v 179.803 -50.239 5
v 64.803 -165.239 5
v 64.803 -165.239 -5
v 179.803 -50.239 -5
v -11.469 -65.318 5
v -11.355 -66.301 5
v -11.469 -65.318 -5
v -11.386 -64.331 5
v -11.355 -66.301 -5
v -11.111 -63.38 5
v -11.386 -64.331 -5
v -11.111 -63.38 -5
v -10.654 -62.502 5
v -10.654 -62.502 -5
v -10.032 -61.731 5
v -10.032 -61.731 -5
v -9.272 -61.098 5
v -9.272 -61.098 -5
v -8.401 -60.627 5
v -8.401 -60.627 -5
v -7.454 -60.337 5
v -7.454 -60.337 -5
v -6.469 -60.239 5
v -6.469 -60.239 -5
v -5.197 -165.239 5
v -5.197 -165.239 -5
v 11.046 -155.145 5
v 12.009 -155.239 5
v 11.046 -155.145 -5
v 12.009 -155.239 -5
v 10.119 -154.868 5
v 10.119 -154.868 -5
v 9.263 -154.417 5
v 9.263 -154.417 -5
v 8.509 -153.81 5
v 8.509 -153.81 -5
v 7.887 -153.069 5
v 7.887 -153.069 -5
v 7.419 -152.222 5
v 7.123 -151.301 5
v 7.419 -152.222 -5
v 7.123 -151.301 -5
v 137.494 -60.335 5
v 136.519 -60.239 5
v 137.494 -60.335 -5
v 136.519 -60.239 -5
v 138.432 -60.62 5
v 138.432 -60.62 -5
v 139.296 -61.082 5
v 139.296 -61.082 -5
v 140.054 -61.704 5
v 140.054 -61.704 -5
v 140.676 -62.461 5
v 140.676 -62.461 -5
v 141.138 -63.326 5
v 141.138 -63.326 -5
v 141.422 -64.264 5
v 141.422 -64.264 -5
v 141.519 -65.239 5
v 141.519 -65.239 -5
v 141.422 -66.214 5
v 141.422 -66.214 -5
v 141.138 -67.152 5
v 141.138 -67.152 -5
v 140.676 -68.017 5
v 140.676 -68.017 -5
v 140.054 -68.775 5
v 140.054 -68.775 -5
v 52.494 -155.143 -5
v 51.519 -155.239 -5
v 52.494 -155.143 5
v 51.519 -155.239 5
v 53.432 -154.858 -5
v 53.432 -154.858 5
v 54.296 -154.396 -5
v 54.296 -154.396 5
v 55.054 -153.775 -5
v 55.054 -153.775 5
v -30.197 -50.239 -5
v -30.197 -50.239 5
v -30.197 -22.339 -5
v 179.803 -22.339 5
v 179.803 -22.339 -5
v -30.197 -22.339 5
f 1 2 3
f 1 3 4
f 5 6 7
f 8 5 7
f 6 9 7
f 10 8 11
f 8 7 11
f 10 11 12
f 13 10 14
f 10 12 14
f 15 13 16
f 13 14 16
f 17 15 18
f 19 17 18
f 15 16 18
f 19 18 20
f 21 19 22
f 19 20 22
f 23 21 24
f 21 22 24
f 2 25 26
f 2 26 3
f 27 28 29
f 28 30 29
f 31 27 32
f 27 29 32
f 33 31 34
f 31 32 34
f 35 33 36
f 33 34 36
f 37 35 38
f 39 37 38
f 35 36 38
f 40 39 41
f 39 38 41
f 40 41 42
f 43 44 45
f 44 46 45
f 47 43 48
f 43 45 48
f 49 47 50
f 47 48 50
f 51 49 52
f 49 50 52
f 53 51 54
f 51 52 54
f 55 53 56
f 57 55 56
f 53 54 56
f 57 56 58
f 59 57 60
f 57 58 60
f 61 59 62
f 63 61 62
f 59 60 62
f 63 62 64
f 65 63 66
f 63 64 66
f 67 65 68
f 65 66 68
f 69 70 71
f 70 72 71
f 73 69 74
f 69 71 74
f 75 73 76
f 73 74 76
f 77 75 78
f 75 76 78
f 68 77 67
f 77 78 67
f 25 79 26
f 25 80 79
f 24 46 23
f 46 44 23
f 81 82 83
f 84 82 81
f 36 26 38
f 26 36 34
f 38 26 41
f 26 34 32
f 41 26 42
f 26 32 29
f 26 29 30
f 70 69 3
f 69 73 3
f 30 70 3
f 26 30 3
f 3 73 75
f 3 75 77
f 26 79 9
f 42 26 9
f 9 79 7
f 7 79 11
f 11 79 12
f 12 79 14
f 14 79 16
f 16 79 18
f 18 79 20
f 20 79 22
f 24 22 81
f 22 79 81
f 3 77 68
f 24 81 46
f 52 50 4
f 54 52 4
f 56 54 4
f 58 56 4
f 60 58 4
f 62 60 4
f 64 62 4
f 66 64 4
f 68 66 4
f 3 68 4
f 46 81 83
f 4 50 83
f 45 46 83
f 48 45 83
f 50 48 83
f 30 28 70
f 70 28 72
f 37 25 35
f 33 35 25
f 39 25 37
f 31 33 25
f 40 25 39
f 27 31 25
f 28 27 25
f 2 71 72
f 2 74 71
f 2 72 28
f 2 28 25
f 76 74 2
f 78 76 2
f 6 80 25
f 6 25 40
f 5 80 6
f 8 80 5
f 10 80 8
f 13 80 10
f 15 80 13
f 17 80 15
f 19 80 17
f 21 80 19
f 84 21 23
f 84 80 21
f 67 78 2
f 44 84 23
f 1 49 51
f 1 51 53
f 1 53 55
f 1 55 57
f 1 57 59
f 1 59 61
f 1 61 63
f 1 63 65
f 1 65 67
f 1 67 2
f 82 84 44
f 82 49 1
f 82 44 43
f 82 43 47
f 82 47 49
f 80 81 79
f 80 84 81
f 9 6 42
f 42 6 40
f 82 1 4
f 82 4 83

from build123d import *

# Parameters (mm, degrees)
BOSS_EXTRU_1_DEPTH = 5
FILLET1_R          = 5


with BuildPart() as part:
    # Esquisse2 → Boss.-Extru.1 (new, symmetric)
    with BuildSketch(Plane.XY):
        Polygon((-30.197209457, -50.23903484), (-5.197209457, -165.23903484), (64.802790543, -165.23903484), (179.802790543, -50.23903484), (179.802790543, -22.33903484), (-30.197209457, -22.33903484), align=None)
        Polygon((53.589587107, -155.23903484), (148.589587107, -60.23903484), (-12.672945593, -60.23903484), (7.97922832, -155.23903484), align=None, mode=Mode.SUBTRACT)
    extrude(amount=BOSS_EXTRU_1_DEPTH, both=True)

    # Fillet1
    fillet1_edges = [part.edges().sort_by_distance(p)[0] for p in [
        (7.97922832, -155.23903484, 0),
        (53.589587107, -155.23903484, 0),
        (148.589587107, -60.23903484, 0),
        (-12.672945593, -60.23903484, 0),
    ]]
    fillet(fillet1_edges, radius=FILLET1_R)


solid = part.part
